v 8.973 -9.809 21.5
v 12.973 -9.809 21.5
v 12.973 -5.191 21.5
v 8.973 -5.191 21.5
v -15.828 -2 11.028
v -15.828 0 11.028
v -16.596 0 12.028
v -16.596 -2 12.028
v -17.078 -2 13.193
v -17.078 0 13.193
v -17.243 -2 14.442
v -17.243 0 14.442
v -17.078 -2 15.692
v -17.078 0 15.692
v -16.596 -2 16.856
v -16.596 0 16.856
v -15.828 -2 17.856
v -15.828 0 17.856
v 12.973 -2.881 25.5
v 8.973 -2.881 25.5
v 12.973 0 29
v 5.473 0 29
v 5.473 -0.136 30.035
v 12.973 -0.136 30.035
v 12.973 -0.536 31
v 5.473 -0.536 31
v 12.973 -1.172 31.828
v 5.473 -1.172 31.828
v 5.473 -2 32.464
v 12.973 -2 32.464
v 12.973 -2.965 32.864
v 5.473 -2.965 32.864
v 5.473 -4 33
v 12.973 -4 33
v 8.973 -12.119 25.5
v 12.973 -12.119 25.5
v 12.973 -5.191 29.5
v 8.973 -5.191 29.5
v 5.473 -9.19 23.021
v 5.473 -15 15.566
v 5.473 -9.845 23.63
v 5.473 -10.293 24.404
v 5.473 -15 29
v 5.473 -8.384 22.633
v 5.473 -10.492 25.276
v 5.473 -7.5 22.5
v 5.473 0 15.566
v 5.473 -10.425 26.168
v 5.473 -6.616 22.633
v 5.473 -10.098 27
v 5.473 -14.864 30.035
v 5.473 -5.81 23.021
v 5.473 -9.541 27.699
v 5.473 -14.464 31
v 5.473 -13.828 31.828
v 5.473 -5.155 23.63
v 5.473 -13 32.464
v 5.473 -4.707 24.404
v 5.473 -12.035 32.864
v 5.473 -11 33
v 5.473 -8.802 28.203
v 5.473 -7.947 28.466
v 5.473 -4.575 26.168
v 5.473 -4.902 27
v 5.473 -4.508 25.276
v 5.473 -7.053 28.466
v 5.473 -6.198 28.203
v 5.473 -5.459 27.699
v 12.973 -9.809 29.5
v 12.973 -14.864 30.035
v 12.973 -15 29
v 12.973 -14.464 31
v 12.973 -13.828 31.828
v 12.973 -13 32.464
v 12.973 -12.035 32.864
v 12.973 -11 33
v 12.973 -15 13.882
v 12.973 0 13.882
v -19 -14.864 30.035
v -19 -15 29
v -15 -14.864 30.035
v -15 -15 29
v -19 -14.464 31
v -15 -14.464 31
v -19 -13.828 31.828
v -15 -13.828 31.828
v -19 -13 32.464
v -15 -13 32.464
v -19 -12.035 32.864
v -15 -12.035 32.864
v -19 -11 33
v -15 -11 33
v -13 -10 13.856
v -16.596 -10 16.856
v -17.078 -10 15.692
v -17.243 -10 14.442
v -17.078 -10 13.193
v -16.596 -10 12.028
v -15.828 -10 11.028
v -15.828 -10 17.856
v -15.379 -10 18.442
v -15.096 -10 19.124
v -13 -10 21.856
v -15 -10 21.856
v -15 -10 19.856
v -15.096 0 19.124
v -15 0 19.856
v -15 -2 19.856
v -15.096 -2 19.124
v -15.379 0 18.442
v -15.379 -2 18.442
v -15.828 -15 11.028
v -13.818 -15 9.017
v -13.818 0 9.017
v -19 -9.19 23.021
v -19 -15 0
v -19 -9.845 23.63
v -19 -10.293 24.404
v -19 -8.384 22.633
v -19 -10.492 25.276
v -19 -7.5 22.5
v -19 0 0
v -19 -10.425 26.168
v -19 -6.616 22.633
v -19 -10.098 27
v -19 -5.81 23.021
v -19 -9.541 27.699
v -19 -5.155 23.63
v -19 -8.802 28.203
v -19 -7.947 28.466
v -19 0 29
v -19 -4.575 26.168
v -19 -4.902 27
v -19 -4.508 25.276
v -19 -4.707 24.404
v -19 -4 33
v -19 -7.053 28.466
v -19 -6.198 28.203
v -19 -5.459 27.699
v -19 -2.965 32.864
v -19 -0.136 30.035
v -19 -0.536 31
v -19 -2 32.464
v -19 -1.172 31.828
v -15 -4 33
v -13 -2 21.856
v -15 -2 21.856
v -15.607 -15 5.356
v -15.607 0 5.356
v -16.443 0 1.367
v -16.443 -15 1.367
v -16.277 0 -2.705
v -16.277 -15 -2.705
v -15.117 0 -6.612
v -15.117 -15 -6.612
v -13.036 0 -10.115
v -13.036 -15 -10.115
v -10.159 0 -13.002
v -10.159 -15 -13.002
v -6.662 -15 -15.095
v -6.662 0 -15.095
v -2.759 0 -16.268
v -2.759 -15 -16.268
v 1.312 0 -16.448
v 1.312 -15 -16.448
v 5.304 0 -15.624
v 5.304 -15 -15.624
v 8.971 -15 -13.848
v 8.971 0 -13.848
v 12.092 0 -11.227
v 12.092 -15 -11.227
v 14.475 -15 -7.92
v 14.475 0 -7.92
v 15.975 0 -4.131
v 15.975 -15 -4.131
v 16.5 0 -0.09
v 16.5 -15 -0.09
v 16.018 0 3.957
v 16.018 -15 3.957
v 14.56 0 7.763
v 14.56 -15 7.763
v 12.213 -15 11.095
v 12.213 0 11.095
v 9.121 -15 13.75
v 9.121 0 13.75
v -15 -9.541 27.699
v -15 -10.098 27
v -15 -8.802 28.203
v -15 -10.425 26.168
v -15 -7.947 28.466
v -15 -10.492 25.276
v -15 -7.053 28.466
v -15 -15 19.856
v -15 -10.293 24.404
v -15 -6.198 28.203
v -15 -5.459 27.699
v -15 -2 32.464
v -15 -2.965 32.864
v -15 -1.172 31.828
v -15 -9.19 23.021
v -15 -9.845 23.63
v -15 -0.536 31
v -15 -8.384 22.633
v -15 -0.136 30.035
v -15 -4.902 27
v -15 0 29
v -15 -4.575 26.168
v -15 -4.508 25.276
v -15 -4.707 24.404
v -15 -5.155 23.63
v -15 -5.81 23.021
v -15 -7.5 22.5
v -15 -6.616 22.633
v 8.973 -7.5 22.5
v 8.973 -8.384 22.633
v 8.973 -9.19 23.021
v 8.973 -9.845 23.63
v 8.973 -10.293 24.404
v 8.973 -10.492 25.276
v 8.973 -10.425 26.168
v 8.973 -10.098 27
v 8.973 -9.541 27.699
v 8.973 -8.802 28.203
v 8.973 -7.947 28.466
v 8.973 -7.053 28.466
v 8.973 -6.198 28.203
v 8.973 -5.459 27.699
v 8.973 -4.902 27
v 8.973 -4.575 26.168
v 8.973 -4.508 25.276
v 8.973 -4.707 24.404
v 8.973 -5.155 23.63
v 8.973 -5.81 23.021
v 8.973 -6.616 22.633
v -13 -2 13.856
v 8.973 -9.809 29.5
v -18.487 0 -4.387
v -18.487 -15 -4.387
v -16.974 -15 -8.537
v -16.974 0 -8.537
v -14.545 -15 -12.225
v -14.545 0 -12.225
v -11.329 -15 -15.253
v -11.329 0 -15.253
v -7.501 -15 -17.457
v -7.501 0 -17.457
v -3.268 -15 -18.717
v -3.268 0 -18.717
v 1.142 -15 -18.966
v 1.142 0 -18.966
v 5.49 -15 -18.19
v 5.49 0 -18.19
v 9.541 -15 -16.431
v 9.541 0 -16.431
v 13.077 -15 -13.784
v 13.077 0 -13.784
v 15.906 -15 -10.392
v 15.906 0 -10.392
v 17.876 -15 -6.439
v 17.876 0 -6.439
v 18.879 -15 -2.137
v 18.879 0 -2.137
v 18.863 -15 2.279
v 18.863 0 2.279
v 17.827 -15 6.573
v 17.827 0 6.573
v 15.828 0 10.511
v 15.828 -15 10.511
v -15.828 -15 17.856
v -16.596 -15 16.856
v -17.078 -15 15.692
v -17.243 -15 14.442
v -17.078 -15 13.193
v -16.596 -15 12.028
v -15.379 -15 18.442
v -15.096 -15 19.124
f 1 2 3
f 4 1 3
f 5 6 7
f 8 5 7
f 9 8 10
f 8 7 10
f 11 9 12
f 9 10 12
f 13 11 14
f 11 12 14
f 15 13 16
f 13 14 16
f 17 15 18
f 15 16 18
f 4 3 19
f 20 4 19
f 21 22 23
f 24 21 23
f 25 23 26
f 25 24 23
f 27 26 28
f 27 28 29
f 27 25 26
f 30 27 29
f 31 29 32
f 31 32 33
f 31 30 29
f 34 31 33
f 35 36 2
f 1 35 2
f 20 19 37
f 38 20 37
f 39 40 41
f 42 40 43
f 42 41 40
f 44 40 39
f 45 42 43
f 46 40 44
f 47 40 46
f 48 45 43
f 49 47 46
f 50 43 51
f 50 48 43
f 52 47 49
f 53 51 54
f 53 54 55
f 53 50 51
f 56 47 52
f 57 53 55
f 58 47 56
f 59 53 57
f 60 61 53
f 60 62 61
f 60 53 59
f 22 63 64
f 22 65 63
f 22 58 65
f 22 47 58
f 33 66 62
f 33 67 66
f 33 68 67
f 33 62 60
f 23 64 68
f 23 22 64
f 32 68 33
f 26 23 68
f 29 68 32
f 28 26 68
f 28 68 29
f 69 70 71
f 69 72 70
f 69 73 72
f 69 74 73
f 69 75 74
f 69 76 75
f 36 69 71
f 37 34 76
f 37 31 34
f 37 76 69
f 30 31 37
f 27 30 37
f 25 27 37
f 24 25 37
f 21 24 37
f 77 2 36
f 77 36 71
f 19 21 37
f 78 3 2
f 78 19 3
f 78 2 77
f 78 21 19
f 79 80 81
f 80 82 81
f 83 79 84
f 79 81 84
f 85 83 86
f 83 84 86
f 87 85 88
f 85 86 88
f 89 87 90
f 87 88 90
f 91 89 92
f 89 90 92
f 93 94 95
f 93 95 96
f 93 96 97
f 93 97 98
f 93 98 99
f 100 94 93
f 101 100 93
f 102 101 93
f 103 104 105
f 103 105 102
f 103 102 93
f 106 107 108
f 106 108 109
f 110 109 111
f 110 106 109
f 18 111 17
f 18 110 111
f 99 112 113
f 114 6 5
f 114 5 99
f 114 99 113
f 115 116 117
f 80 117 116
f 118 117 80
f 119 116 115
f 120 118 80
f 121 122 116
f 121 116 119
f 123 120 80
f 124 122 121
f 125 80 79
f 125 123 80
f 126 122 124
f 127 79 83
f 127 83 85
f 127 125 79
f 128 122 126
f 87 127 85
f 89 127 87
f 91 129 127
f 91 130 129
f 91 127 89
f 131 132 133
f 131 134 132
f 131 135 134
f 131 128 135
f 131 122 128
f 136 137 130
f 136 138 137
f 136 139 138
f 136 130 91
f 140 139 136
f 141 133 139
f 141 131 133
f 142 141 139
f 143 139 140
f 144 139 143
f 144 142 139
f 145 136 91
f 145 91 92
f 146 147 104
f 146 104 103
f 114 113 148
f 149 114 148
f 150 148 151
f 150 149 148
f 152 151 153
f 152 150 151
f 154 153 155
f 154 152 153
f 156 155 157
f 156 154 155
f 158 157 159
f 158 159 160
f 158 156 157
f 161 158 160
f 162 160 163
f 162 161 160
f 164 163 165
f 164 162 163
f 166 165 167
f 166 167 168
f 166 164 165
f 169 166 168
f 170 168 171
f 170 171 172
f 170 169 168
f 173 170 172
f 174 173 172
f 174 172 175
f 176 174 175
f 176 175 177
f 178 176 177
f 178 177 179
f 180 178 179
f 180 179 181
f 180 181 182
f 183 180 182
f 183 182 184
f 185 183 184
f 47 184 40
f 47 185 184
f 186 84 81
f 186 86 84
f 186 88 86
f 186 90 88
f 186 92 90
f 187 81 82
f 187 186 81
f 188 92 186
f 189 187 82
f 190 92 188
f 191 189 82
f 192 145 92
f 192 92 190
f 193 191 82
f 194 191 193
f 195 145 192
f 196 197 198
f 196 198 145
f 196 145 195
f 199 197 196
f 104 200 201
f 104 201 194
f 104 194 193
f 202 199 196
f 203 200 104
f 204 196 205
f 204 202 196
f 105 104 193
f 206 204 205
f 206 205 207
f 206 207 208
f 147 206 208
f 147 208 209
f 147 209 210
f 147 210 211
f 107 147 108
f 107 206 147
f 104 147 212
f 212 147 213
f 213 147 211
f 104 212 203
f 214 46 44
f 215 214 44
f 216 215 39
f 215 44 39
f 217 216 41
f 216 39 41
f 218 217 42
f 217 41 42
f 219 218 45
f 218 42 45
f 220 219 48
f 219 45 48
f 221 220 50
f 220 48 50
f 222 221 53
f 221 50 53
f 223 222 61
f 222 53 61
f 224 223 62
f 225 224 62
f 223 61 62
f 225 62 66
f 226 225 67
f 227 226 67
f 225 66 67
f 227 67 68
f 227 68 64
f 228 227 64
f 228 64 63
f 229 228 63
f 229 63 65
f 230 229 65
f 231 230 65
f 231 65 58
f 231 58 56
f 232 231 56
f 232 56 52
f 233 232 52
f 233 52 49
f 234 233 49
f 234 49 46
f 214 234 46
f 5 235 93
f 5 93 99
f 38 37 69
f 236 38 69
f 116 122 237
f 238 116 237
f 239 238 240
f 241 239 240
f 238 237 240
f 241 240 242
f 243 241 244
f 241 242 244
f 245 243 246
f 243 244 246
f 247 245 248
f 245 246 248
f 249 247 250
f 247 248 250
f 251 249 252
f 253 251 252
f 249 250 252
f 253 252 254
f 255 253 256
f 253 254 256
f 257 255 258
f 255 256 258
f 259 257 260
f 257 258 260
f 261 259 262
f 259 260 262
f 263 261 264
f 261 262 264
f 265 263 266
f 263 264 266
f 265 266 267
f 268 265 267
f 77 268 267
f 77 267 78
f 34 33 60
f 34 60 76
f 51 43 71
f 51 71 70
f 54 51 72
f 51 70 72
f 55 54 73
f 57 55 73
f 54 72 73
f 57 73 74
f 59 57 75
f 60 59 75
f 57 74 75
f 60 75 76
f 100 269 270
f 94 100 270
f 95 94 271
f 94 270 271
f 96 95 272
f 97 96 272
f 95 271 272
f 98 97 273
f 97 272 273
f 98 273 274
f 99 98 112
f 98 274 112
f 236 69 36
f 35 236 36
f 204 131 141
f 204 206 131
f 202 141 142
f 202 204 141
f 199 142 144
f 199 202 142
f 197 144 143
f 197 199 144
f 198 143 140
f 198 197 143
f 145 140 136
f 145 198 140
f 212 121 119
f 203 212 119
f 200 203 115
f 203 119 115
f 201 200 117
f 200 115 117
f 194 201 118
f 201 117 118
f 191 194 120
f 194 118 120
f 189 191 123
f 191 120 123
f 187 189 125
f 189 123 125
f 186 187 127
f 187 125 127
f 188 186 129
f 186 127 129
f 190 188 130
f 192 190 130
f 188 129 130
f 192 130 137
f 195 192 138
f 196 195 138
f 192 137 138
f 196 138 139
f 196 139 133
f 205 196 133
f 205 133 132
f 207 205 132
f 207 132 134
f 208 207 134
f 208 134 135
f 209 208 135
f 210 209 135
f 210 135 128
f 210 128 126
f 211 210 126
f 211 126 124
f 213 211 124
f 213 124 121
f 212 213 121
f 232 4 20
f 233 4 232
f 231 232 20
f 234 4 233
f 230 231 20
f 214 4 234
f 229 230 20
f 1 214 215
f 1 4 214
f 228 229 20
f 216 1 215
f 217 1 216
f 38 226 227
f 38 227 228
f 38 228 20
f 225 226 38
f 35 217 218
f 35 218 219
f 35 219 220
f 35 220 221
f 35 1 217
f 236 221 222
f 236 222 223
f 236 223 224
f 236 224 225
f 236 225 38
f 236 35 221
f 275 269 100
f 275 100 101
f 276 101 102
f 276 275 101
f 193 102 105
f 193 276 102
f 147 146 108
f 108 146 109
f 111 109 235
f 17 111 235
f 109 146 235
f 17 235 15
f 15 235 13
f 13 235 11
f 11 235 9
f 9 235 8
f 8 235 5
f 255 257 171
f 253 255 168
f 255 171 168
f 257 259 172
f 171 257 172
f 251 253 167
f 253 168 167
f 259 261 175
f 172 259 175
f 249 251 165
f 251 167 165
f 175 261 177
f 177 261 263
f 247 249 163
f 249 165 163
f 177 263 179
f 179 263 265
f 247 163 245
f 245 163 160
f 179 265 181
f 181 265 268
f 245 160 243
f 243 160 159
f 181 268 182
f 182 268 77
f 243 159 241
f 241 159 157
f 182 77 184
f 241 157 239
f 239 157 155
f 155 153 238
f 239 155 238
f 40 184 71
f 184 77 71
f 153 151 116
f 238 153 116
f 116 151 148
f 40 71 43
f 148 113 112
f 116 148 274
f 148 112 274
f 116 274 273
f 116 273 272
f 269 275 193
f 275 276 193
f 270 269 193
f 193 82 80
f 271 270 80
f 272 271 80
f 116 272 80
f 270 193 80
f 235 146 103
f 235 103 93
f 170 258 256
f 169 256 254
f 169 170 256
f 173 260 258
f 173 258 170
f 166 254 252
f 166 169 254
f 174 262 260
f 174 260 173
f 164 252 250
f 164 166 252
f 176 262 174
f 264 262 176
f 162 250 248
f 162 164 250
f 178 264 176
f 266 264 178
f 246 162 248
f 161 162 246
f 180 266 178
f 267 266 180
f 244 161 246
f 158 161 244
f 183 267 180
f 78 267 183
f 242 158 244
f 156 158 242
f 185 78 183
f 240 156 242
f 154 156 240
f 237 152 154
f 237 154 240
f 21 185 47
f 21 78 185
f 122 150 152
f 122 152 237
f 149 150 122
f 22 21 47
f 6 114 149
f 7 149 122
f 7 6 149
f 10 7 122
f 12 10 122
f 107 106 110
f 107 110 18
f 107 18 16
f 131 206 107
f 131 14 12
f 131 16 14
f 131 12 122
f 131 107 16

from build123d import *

# Parameters (mm, degrees)
PAD_DEPTH       = 15
SKETCH001_R     = 3
POCKET_DEPTH    = 38.001
FILLET_R        = 4
POCKET001_DEPTH = 4
POCKET002_DEPTH = 5
POCKET003_DEPTH = 2


with BuildPart() as part:
    # Sketch → Pad (new body)
    with BuildSketch(Plane.XZ):
        with BuildLine():
            Line((-19, 0), (-19, 33))
            Line((-19, 33), (-15, 33))
            Line((-15, 33), (-15, 21.856406))
            Line((-15, 21.856406), (-13, 21.856406))
            Line((-13, 21.856406), (-13, 13.856406))
            Line((-13, 13.856406), (-15.828427, 11.027979))
            Line((-15.828427, 11.027979), (-13.817926, 9.017478))
            ThreePointArc((-13.817926, 9.017478), (5.303714, -15.62436), (5.473078, 15.565841))
            Line((5.473078, 15.565841), (5.473078, 33))
            Line((5.473078, 33), (12.973078, 33))
            Line((12.973078, 33), (12.973078, 13.881615))
            ThreePointArc((-19, 0), (7.566753, -17.42826), (12.973078, 13.881615))
        make_face()
    extrude(amount=PAD_DEPTH)

    # Sketch001 (on Face1 of Pad) → Pocket (cut, through all)
    with BuildSketch(Plane(origin=(-19, 0, 0), x_dir=(0, 0, -1), z_dir=(-1, 0, 0))):
        with Locations((-25.5, 7.5)):
            Circle(SKETCH001_R)
    extrude(amount=-POCKET_DEPTH, mode=Mode.SUBTRACT)

    # Fillet
    fillet_edges = [part.edges().sort_by_distance(p)[0] for p in [
        (-17, 0, 33),
        (-17, -15, 33),
        (9.223078, -15, 33),
        (9.223078, 0, 33),
    ]]
    fillet(fillet_edges, radius=FILLET_R)

    # Sketch002 (on Face10 of Fillet) → Pocket001 (cut)
    with BuildSketch(Plane(origin=(12.973078, 0, 0), x_dir=(0, 0, 1), z_dir=(1, 0, 0))):
        Polygon((21.5, 9.809401), (21.5, 5.190599), (25.5, 2.881198), (29.5, 5.190599), (29.5, 9.809401), (25.5, 12.118802), align=None)
    extrude(amount=-POCKET001_DEPTH, mode=Mode.SUBTRACT)

    # Sketch003 (on Face6 of Pocket001) → Pocket002 (cut)
    with BuildSketch(Plane.XZ.offset(15)):
        with BuildLine():
            Line((-15, 21.856406), (-15, 19.856406))
            ThreePointArc((-15.828427, 17.856406), (-15.215301, 18.774014), (-15, 19.856406))
            ThreePointArc((-15.828427, 17.856406), (-17.242641, 14.442193), (-15.828427, 11.027979))
            Line((-13, 13.856406), (-15.828427, 11.027979))
            Line((-13, 21.856406), (-13, 13.856406))
            Line((-15, 21.856406), (-13, 21.856406))
        make_face()
    extrude(amount=-POCKET002_DEPTH, mode=Mode.SUBTRACT)

    # Sketch004 (on Face2 of Pocket002) → Pocket003 (cut)
    with BuildSketch(Plane(origin=(0, 0, 0), x_dir=(1, 0, 0), z_dir=(0, 1, 0))):
        with BuildLine():
            Line((-15, -21.856406), (-15, -19.856406))
            ThreePointArc((-15, -19.856406), (-15.215301, -18.774014), (-15.828427, -17.856406))
            ThreePointArc((-15.828427, -11.027979), (-17.242641, -14.442193), (-15.828427, -17.856406))
            Line((-13, -13.856406), (-15.828427, -11.027979))
            Line((-13, -21.856406), (-13, -13.856406))
            Line((-15, -21.856406), (-13, -21.856406))
        make_face()
    extrude(amount=-POCKET003_DEPTH, mode=Mode.SUBTRACT)


solid = part.part
